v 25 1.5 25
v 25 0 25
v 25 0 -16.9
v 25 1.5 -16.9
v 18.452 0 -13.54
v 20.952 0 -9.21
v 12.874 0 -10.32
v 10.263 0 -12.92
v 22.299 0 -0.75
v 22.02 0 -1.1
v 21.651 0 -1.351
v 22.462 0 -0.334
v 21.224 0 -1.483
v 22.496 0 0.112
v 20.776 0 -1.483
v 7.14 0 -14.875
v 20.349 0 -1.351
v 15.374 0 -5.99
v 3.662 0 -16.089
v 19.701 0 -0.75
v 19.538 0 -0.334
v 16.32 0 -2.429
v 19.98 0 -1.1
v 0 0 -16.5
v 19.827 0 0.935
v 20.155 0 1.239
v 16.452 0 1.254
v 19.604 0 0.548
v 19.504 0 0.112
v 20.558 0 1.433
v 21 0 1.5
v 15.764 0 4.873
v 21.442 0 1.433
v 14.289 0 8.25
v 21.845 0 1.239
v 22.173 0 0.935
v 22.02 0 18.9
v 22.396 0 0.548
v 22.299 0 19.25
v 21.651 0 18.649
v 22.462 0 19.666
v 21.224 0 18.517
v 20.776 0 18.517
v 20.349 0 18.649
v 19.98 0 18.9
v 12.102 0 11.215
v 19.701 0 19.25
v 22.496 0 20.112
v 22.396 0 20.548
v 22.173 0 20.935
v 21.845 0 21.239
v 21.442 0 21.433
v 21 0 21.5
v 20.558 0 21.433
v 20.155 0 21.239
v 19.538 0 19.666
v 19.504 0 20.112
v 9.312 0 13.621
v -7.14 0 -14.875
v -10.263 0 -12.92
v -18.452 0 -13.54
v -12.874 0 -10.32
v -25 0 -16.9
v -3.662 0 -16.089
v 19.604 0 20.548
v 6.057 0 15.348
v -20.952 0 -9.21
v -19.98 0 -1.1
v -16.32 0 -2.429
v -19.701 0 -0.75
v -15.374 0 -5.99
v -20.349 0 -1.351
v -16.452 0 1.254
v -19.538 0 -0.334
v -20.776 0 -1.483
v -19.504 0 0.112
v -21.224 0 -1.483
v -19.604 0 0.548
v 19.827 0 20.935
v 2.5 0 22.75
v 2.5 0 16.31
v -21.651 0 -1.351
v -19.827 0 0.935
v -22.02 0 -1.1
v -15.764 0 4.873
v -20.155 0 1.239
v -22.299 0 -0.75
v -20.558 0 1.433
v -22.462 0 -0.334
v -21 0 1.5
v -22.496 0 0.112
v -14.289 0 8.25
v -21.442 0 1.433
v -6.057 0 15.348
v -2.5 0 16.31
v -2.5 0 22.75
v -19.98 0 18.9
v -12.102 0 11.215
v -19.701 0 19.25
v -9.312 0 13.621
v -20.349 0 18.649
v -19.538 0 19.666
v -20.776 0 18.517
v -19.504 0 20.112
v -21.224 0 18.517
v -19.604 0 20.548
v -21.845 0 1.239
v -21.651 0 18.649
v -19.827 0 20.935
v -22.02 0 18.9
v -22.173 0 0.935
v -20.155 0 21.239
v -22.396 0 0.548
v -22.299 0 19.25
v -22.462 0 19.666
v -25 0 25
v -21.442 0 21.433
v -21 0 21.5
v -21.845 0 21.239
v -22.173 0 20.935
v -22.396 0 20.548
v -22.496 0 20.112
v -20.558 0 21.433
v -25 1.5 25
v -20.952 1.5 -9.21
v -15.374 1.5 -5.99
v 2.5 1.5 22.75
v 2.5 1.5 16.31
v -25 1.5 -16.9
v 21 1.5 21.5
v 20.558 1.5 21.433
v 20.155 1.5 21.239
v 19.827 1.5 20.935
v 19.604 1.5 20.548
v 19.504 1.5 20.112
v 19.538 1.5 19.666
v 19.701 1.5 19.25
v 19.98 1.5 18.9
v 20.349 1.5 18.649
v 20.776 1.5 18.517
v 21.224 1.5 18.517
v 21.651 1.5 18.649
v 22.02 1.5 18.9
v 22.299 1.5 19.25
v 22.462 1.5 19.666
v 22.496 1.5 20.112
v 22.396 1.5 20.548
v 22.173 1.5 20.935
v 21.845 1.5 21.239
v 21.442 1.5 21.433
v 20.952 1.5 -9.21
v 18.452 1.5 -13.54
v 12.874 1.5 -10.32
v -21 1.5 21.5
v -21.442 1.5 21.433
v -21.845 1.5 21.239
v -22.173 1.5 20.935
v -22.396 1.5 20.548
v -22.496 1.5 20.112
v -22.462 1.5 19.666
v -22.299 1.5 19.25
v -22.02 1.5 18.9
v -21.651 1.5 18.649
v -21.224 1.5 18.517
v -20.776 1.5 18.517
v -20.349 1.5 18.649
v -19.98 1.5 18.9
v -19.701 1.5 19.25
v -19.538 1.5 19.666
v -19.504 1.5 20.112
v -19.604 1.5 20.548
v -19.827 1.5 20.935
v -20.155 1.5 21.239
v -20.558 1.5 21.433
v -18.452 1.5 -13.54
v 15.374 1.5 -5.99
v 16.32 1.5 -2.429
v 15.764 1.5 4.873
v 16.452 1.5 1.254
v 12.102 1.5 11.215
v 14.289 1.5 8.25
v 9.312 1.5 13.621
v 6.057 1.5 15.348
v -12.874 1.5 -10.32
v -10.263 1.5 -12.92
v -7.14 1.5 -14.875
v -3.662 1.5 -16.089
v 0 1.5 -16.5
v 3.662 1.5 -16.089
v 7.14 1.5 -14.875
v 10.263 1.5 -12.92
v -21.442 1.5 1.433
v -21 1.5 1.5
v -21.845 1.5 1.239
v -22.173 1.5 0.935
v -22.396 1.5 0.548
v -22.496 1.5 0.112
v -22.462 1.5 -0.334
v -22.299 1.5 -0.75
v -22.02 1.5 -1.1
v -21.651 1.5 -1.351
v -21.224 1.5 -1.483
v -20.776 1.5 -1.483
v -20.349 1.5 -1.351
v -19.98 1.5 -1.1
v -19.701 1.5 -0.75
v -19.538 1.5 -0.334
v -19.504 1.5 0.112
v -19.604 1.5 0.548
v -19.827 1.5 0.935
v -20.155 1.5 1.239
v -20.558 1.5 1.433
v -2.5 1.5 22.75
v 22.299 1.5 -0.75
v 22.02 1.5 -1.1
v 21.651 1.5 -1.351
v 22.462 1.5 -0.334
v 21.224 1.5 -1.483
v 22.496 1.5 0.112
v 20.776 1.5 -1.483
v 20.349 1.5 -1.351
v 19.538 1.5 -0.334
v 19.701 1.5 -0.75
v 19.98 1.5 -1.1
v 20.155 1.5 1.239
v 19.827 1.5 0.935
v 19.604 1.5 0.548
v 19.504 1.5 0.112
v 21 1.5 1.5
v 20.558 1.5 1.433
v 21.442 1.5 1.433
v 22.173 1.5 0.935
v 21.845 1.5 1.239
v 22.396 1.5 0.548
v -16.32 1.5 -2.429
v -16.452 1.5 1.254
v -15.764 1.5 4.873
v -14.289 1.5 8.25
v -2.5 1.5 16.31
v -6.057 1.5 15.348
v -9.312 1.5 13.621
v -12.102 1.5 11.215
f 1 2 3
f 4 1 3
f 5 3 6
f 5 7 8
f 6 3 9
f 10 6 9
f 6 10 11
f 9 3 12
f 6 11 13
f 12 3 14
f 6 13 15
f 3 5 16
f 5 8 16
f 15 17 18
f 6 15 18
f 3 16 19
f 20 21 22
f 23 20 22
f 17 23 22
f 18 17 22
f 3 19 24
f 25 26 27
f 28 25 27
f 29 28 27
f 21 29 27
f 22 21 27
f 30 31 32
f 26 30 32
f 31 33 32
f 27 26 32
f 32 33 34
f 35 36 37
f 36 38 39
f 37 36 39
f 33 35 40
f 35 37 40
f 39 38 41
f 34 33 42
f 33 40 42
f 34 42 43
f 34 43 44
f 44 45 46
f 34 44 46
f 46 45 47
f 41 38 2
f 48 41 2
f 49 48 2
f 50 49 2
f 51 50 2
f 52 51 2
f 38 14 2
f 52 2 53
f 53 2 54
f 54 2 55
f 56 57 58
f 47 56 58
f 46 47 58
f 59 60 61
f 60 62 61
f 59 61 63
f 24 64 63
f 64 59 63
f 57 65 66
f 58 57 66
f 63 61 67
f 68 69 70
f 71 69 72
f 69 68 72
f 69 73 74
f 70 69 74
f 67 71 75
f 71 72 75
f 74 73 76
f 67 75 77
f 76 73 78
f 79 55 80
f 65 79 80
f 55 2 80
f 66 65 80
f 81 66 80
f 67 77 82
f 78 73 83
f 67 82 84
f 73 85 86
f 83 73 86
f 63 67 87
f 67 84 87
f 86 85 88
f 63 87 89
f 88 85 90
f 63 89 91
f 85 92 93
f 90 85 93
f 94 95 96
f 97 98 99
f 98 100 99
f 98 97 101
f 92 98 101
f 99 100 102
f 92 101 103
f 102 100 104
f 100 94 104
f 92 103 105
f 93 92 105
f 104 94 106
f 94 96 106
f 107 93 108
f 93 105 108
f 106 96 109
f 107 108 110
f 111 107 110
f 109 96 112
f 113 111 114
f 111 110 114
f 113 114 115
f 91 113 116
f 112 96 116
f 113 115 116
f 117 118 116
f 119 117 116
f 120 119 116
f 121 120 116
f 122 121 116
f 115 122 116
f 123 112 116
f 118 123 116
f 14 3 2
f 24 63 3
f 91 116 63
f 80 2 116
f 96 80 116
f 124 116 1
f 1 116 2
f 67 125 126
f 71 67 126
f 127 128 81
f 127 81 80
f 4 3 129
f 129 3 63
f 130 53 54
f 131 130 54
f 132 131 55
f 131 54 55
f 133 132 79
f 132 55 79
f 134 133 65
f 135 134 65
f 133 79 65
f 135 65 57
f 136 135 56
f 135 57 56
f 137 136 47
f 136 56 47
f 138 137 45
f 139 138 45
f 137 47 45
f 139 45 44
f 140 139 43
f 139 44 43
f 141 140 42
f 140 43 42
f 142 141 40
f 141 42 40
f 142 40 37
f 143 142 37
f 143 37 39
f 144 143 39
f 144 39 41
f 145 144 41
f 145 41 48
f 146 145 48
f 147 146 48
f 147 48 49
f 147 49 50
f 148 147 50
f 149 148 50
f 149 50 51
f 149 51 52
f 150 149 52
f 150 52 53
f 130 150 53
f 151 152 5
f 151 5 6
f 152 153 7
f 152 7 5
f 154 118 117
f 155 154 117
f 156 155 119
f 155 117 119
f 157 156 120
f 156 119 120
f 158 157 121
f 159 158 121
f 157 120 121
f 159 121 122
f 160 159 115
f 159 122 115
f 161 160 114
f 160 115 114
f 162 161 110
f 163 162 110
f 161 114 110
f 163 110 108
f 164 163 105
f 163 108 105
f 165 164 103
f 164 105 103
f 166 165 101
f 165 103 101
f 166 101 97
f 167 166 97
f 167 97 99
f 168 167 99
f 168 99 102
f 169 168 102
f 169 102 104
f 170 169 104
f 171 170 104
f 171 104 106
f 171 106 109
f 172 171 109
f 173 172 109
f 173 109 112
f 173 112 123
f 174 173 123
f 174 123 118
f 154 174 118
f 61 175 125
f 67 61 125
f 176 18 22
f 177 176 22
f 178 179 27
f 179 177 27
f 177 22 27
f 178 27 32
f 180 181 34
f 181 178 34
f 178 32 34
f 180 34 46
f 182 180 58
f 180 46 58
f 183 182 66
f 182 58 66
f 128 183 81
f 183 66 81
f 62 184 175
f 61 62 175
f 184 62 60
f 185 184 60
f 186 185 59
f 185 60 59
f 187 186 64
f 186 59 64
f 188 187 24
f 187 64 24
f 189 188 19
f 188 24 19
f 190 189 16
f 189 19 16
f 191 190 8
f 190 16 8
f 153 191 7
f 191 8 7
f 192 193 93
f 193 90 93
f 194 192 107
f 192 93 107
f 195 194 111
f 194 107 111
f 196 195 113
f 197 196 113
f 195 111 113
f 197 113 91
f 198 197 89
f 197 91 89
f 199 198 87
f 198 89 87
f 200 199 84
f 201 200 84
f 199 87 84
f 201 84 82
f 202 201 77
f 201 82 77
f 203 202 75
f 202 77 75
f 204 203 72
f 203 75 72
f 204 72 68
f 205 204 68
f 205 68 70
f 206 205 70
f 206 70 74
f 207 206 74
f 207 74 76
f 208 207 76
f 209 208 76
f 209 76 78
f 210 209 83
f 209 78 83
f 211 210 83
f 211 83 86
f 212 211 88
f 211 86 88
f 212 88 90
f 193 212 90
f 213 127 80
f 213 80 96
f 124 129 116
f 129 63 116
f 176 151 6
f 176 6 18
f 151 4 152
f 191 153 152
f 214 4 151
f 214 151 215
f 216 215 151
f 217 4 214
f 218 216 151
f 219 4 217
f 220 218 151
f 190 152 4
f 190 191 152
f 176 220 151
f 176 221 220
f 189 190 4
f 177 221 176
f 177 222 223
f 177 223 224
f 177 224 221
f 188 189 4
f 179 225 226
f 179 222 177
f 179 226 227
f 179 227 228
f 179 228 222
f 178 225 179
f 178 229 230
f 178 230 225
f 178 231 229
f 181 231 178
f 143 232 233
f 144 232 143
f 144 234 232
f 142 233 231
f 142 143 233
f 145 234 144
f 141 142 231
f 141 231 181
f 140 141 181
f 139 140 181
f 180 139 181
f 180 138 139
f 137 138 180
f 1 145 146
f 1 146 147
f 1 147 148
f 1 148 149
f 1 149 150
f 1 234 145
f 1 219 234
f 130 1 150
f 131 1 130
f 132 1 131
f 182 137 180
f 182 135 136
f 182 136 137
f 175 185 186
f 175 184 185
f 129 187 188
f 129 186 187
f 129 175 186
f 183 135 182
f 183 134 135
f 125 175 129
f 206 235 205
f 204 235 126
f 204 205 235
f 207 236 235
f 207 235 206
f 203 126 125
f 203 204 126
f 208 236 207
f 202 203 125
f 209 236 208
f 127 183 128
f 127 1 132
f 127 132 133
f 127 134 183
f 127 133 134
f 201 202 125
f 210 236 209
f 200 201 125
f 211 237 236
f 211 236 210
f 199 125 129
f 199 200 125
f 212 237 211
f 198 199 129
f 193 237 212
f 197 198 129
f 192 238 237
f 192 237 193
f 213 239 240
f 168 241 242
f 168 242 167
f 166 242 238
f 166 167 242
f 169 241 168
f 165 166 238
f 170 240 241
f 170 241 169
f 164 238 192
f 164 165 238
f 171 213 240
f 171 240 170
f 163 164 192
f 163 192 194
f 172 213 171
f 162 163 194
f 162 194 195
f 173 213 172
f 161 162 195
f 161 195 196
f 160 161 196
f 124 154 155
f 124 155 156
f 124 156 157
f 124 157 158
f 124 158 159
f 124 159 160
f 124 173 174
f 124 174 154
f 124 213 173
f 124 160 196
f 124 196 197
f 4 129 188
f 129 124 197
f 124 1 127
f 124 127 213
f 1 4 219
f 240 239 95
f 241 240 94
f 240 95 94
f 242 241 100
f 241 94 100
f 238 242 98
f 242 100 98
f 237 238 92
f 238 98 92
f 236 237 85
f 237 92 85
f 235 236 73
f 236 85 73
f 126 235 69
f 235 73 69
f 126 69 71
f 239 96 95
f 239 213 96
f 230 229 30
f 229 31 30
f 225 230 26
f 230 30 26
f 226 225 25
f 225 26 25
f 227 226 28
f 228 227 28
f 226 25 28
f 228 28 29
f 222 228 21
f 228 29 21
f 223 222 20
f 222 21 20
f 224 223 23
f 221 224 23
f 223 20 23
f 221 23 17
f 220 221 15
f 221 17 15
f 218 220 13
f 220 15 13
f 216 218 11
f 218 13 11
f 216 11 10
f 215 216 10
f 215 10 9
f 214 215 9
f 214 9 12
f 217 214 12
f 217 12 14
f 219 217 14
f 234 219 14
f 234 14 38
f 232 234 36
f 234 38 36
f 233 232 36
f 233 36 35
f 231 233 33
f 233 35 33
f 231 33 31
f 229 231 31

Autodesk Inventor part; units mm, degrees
ref_plane "YZ Plane" through (0, 0, 0) normal (1, 0, 0) x (0, 1, 0)
ref_plane "XZ Plane" through (0, 0, 0) normal (0, 1, 0) x (-1, 0, 0)
ref_plane "XY Plane" through (0, 0, 0) normal (0, 0, 1) x (1, 0, 0)
sketch "スケッチ1" plane through (0, 0, 0) normal (0, 1, 0) x (-1, 0, 0)
  line L0 (25, 25) -> (-25, 25)
  line L1 (-25, 25) -> (-25, -16.9)
  line L2 (-25, -16.9) -> (25, -16.9)
  line L3 (25, -16.9) -> (25, 25)
  circle A0 centre (0, 0) radius 16.5
  point P0 (0, 25)
  dimension "d0" = 50
  dimension "d1" = 16.9
  dimension "d2" = 25
  dimension "d3" = 33
extrude "押し出し1" add sketch "スケッチ1" along normal blind 1.5
sketch "スケッチ2" plane through (0, 1.5, 0) normal (0, 1, 0) x (1, 0, 0)
  line L0 (-11.9569, 9.7901) -> (-18.4521, 13.5401)
  line L1 (-18.4521, 13.5401) -> (-20.9521, 9.2099)
  line L2 (-20.9521, 9.2099) -> (-14.4569, 5.4599)
  line L3 (-14.4569, 5.4599) -> (-11.9569, 9.7901)
  line L4 (-11.9569, 9.7901) -> (-20.9521, 9.2099) construction
  line L5 (-18.4521, 13.5401) -> (-14.4569, 5.4599) construction
  line L6 (20.9521, 9.2099) -> (14.4569, 5.4599)
  line L7 (14.4569, 5.4599) -> (11.9569, 9.7901)
  line L8 (11.9569, 9.7901) -> (18.4521, 13.5401)
  line L9 (18.4521, 13.5401) -> (20.9521, 9.2099)
  line L10 (20.9521, 9.2099) -> (11.9569, 9.7901) construction
  line L11 (14.4569, 5.4599) -> (18.4521, 13.5401) construction
  line L12 (-2.5, -22.75) -> (-2.5, -15.25)
  line L13 (-2.5, -15.25) -> (2.5, -15.25)
  line L14 (2.5, -15.25) -> (2.5, -22.75)
  line L15 (2.5, -22.75) -> (-2.5, -22.75)
  line L16 (-2.5, -22.75) -> (2.5, -15.25) construction
  line L17 (-2.5, -15.25) -> (2.5, -22.75) construction
  line L18 (25, 16.9) -> (-25, 16.9) projected
  point P0 (0, 0)
  point P1 (0, -19)
  point P2 (-16.4545, 9.5)
  point P3 (16.4545, 9.5)
  dimension "d6" = 120
  dimension "d7" = 120
  dimension "d8" = 19
  dimension "d9" = 19
  dimension "d10" = 19
  dimension "d11" = 30
  dimension "d12" = 30
  dimension "d13" = 5
  dimension "d14" = 7.5
  dimension "d15" = 5
  dimension "d16" = 7.5
  dimension "d17" = 5
  dimension "d18" = 7.5
extrude "押し出し2" cut sketch "スケッチ2" against normal blind 1.5
sketch "スケッチ3" plane through (0, 1.5, 0) normal (0, 1, 0) x (1, 0, 0)
  line L0 (25, -25) -> (25, 16.9) projected
  line L1 (-25, -25) -> (25, -25) projected
  line L2 (-25, 16.9) -> (-25, -25) projected
  line L3 (25, 16.9) -> (-25, 16.9) projected
  point P0 (0, 0)
  point P1 (-21, -20)
  point P2 (-21, 0)
  point P3 (21, 0)
  point P4 (21, -20)
  dimension "d21" = 4
  dimension "d22" = 5
  dimension "d23" = 4
  dimension "d34" = 20
hole "穴1" at (-21, 1.5, 20) at (-21, 1.5, 0) at (21, 1.5, 0) at (21, 1.5, 20) direction (0, -1, 0) diameter 3 end through all
properties part number "shaft_holder" material "アルミニウム 6061"
